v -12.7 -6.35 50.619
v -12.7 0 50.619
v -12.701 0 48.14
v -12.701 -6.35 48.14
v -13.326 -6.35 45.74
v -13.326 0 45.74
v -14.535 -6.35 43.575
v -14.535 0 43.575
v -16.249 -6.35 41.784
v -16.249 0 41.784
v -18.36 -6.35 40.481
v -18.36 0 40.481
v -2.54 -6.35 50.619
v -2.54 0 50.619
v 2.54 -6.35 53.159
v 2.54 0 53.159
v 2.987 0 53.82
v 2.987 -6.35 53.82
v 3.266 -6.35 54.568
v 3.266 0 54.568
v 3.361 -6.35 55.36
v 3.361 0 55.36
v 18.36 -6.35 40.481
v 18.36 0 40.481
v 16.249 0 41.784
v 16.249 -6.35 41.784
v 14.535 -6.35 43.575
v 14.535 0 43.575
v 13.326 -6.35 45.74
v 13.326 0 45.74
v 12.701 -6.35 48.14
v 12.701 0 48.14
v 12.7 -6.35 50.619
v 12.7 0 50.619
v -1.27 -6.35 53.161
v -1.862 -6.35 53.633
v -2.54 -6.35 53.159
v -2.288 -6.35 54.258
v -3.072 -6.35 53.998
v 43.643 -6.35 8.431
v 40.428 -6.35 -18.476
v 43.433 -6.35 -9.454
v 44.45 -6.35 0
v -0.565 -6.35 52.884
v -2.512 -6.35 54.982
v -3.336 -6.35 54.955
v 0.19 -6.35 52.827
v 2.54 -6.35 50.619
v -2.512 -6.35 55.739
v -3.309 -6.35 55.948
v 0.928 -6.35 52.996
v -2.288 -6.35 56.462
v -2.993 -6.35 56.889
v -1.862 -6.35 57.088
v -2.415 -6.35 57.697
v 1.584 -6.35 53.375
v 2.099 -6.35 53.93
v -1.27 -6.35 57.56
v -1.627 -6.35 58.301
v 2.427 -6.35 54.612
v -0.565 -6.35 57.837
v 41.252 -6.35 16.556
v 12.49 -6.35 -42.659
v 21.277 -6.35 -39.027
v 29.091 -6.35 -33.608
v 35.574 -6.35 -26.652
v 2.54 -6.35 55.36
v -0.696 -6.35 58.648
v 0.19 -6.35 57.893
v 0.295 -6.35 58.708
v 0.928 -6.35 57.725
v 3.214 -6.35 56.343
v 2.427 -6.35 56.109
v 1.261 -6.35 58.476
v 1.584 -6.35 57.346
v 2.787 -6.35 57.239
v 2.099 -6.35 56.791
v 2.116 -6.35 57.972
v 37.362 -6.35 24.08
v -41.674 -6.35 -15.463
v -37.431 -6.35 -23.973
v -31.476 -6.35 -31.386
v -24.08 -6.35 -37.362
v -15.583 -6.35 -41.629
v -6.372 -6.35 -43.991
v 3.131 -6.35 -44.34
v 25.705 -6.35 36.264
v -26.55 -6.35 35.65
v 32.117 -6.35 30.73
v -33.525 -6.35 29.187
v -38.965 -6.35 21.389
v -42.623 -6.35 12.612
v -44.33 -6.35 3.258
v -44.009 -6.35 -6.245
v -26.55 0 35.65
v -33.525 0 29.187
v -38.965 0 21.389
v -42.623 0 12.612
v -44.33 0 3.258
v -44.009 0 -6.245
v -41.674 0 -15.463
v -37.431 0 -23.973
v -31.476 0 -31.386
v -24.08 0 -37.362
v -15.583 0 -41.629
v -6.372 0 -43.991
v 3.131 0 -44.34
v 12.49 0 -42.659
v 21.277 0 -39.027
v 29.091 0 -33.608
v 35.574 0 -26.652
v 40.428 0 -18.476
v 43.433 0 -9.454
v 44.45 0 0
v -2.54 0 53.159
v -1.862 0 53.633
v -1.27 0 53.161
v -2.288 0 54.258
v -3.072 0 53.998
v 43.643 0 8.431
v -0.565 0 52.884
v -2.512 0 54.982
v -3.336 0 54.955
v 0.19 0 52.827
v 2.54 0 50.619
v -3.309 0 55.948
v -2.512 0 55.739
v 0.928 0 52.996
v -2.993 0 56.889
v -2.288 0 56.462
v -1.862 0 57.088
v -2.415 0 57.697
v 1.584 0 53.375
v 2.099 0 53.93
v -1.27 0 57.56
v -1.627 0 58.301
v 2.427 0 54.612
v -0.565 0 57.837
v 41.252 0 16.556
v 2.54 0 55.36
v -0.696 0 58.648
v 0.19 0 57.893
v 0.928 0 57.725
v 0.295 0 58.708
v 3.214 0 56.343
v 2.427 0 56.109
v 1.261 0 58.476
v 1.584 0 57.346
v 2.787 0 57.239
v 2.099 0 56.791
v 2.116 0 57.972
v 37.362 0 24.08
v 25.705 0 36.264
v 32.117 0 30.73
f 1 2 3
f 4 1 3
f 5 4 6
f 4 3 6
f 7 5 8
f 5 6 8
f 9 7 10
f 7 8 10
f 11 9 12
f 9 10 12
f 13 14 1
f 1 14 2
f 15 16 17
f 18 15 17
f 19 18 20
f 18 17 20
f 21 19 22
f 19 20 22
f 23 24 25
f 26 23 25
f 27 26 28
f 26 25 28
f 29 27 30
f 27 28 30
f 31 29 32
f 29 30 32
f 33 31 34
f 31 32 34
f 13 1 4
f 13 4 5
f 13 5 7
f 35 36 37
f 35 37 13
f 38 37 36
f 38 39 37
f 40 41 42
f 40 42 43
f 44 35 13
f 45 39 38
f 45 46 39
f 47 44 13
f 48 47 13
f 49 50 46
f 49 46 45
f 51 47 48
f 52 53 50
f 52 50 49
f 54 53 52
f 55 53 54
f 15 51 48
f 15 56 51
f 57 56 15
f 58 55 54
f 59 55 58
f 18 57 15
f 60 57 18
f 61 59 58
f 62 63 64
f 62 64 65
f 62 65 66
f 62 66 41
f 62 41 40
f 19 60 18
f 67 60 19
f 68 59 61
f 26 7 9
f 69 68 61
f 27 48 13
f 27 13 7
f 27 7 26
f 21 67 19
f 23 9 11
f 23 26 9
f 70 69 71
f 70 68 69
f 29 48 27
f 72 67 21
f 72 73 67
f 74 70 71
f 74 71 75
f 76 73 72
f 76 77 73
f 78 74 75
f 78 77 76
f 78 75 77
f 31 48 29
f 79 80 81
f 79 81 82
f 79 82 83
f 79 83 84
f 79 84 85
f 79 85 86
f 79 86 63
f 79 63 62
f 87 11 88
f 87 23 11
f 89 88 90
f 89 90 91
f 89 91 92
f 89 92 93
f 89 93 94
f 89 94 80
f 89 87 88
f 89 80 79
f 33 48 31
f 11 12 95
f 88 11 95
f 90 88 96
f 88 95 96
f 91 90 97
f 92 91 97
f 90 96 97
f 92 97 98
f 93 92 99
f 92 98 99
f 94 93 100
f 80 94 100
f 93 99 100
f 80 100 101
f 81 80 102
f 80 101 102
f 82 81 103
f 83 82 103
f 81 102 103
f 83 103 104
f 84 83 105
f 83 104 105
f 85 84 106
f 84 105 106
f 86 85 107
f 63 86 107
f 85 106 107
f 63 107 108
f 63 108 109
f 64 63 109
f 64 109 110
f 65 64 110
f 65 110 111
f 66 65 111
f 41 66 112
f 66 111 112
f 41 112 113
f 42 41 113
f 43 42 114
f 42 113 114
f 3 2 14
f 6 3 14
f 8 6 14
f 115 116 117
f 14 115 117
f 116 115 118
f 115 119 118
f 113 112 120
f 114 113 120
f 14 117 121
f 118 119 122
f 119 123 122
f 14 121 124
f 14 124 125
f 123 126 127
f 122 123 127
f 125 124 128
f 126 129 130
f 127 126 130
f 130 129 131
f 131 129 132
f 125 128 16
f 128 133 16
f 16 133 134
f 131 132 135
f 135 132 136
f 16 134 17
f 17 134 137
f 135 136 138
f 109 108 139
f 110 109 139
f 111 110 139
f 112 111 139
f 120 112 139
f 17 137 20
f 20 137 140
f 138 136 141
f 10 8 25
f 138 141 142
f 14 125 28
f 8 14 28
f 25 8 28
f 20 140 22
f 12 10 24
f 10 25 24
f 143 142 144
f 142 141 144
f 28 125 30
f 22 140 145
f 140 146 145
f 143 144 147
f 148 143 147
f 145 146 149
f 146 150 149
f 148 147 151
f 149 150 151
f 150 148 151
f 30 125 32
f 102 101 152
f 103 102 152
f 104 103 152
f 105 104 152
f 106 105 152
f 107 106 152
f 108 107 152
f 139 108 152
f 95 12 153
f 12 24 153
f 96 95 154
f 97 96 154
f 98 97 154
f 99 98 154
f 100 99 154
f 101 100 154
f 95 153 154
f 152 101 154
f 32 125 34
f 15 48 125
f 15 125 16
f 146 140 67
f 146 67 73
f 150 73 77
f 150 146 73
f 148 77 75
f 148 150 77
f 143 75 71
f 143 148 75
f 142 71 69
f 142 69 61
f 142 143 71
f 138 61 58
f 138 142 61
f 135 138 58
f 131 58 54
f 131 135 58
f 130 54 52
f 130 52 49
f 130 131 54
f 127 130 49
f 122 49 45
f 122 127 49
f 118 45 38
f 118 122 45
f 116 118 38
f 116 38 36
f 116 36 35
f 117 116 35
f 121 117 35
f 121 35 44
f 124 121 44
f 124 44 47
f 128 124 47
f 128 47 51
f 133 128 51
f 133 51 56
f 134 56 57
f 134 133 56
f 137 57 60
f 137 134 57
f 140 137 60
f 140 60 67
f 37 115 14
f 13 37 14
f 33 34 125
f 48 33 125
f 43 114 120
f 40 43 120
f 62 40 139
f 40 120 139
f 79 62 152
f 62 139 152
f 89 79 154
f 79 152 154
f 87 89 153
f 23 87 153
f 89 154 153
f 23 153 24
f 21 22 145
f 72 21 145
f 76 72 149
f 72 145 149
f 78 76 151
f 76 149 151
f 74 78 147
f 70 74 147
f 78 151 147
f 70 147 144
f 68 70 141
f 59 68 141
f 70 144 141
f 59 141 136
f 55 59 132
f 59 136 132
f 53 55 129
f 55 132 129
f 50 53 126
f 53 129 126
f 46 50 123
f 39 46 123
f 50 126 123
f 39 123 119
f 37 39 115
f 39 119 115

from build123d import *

# Parameters (mm, degrees)
F0_R     = 2.54
F1_DEPTH = 6.35


with BuildPart() as f1:
    # F0 (on Front) → F1 (new body)
    with BuildSketch(Plane.XZ):
        with BuildLine():
            ThreePointArc((-18.35955, 40.481223), (-24.080288, -37.36231), (44.45, 0))
            ThreePointArc((44.45, 0), (37.36231, 24.080288), (18.35955, 40.481223))
            ThreePointArc((18.35955, 40.481223), (0, 44.45), (-18.35955, 40.481223))
        make_face()
        with BuildLine():
            ThreePointArc((-18.35955, 40.481223), (0, 44.45), (18.35955, 40.481223))
            ThreePointArc((18.35955, 40.481223), (13.86159, 44.619019), (12.7, 50.619328))
            Line((12.7, 50.619328), (2.54, 50.619328))
            Line((2.54, 50.619328), (0, 50.619328))
            Line((0, 50.619328), (-2.54, 50.619328))
            Line((-2.54, 50.619328), (-12.7, 50.619328))
            ThreePointArc((-12.7, 50.619328), (-13.86159, 44.619019), (-18.35955, 40.481223))
        make_face()
        with BuildLine():
            Line((0, 50.619328), (2.54, 50.619328))
            Line((2.54, 50.619328), (2.54, 53.159328))
            ThreePointArc((2.54, 53.159328), (0, 51.999384), (-2.54, 53.159328))
            Line((-2.54, 53.159328), (-2.54, 50.619328))
            Line((-2.54, 50.619328), (0, 50.619328))
        make_face()
        with BuildLine():
            ThreePointArc((-2.54, 53.159328), (0, 51.999384), (2.54, 53.159328))
            ThreePointArc((2.54, 53.159328), (3.149045, 54.185778), (3.360969, 55.360353))
            ThreePointArc((3.360969, 55.360353), (-1.174575, 58.509398), (-2.54, 53.159328))
        make_face()
        with Locations((0, 55.360353)):
            Circle(F0_R, mode=Mode.SUBTRACT)
    extrude(amount=F1_DEPTH)


solid = f1.part
